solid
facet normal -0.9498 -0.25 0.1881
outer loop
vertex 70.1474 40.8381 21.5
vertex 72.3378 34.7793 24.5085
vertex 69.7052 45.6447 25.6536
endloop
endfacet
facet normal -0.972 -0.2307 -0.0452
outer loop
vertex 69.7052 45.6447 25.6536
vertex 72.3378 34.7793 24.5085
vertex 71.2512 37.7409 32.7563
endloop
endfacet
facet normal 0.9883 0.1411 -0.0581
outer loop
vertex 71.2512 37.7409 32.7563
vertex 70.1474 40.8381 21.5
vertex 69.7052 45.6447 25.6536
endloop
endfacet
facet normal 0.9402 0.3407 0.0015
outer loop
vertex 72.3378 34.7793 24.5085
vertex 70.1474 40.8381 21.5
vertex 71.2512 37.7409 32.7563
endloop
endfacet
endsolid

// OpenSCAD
// Auto-generated auxetic polyhedron
points = [
    [69.705184, 45.644695, 25.653646],
    [72.337754, 34.779344, 24.508526],
    [70.147361, 40.838052, 21.500000],
    [71.251190, 37.740931, 32.756251],
];

faces = [
    [0, 1, 2],
    [3, 1, 0],
    [0, 2, 3],
    [3, 2, 1],
];

polyhedron(points = points, faces = faces);
